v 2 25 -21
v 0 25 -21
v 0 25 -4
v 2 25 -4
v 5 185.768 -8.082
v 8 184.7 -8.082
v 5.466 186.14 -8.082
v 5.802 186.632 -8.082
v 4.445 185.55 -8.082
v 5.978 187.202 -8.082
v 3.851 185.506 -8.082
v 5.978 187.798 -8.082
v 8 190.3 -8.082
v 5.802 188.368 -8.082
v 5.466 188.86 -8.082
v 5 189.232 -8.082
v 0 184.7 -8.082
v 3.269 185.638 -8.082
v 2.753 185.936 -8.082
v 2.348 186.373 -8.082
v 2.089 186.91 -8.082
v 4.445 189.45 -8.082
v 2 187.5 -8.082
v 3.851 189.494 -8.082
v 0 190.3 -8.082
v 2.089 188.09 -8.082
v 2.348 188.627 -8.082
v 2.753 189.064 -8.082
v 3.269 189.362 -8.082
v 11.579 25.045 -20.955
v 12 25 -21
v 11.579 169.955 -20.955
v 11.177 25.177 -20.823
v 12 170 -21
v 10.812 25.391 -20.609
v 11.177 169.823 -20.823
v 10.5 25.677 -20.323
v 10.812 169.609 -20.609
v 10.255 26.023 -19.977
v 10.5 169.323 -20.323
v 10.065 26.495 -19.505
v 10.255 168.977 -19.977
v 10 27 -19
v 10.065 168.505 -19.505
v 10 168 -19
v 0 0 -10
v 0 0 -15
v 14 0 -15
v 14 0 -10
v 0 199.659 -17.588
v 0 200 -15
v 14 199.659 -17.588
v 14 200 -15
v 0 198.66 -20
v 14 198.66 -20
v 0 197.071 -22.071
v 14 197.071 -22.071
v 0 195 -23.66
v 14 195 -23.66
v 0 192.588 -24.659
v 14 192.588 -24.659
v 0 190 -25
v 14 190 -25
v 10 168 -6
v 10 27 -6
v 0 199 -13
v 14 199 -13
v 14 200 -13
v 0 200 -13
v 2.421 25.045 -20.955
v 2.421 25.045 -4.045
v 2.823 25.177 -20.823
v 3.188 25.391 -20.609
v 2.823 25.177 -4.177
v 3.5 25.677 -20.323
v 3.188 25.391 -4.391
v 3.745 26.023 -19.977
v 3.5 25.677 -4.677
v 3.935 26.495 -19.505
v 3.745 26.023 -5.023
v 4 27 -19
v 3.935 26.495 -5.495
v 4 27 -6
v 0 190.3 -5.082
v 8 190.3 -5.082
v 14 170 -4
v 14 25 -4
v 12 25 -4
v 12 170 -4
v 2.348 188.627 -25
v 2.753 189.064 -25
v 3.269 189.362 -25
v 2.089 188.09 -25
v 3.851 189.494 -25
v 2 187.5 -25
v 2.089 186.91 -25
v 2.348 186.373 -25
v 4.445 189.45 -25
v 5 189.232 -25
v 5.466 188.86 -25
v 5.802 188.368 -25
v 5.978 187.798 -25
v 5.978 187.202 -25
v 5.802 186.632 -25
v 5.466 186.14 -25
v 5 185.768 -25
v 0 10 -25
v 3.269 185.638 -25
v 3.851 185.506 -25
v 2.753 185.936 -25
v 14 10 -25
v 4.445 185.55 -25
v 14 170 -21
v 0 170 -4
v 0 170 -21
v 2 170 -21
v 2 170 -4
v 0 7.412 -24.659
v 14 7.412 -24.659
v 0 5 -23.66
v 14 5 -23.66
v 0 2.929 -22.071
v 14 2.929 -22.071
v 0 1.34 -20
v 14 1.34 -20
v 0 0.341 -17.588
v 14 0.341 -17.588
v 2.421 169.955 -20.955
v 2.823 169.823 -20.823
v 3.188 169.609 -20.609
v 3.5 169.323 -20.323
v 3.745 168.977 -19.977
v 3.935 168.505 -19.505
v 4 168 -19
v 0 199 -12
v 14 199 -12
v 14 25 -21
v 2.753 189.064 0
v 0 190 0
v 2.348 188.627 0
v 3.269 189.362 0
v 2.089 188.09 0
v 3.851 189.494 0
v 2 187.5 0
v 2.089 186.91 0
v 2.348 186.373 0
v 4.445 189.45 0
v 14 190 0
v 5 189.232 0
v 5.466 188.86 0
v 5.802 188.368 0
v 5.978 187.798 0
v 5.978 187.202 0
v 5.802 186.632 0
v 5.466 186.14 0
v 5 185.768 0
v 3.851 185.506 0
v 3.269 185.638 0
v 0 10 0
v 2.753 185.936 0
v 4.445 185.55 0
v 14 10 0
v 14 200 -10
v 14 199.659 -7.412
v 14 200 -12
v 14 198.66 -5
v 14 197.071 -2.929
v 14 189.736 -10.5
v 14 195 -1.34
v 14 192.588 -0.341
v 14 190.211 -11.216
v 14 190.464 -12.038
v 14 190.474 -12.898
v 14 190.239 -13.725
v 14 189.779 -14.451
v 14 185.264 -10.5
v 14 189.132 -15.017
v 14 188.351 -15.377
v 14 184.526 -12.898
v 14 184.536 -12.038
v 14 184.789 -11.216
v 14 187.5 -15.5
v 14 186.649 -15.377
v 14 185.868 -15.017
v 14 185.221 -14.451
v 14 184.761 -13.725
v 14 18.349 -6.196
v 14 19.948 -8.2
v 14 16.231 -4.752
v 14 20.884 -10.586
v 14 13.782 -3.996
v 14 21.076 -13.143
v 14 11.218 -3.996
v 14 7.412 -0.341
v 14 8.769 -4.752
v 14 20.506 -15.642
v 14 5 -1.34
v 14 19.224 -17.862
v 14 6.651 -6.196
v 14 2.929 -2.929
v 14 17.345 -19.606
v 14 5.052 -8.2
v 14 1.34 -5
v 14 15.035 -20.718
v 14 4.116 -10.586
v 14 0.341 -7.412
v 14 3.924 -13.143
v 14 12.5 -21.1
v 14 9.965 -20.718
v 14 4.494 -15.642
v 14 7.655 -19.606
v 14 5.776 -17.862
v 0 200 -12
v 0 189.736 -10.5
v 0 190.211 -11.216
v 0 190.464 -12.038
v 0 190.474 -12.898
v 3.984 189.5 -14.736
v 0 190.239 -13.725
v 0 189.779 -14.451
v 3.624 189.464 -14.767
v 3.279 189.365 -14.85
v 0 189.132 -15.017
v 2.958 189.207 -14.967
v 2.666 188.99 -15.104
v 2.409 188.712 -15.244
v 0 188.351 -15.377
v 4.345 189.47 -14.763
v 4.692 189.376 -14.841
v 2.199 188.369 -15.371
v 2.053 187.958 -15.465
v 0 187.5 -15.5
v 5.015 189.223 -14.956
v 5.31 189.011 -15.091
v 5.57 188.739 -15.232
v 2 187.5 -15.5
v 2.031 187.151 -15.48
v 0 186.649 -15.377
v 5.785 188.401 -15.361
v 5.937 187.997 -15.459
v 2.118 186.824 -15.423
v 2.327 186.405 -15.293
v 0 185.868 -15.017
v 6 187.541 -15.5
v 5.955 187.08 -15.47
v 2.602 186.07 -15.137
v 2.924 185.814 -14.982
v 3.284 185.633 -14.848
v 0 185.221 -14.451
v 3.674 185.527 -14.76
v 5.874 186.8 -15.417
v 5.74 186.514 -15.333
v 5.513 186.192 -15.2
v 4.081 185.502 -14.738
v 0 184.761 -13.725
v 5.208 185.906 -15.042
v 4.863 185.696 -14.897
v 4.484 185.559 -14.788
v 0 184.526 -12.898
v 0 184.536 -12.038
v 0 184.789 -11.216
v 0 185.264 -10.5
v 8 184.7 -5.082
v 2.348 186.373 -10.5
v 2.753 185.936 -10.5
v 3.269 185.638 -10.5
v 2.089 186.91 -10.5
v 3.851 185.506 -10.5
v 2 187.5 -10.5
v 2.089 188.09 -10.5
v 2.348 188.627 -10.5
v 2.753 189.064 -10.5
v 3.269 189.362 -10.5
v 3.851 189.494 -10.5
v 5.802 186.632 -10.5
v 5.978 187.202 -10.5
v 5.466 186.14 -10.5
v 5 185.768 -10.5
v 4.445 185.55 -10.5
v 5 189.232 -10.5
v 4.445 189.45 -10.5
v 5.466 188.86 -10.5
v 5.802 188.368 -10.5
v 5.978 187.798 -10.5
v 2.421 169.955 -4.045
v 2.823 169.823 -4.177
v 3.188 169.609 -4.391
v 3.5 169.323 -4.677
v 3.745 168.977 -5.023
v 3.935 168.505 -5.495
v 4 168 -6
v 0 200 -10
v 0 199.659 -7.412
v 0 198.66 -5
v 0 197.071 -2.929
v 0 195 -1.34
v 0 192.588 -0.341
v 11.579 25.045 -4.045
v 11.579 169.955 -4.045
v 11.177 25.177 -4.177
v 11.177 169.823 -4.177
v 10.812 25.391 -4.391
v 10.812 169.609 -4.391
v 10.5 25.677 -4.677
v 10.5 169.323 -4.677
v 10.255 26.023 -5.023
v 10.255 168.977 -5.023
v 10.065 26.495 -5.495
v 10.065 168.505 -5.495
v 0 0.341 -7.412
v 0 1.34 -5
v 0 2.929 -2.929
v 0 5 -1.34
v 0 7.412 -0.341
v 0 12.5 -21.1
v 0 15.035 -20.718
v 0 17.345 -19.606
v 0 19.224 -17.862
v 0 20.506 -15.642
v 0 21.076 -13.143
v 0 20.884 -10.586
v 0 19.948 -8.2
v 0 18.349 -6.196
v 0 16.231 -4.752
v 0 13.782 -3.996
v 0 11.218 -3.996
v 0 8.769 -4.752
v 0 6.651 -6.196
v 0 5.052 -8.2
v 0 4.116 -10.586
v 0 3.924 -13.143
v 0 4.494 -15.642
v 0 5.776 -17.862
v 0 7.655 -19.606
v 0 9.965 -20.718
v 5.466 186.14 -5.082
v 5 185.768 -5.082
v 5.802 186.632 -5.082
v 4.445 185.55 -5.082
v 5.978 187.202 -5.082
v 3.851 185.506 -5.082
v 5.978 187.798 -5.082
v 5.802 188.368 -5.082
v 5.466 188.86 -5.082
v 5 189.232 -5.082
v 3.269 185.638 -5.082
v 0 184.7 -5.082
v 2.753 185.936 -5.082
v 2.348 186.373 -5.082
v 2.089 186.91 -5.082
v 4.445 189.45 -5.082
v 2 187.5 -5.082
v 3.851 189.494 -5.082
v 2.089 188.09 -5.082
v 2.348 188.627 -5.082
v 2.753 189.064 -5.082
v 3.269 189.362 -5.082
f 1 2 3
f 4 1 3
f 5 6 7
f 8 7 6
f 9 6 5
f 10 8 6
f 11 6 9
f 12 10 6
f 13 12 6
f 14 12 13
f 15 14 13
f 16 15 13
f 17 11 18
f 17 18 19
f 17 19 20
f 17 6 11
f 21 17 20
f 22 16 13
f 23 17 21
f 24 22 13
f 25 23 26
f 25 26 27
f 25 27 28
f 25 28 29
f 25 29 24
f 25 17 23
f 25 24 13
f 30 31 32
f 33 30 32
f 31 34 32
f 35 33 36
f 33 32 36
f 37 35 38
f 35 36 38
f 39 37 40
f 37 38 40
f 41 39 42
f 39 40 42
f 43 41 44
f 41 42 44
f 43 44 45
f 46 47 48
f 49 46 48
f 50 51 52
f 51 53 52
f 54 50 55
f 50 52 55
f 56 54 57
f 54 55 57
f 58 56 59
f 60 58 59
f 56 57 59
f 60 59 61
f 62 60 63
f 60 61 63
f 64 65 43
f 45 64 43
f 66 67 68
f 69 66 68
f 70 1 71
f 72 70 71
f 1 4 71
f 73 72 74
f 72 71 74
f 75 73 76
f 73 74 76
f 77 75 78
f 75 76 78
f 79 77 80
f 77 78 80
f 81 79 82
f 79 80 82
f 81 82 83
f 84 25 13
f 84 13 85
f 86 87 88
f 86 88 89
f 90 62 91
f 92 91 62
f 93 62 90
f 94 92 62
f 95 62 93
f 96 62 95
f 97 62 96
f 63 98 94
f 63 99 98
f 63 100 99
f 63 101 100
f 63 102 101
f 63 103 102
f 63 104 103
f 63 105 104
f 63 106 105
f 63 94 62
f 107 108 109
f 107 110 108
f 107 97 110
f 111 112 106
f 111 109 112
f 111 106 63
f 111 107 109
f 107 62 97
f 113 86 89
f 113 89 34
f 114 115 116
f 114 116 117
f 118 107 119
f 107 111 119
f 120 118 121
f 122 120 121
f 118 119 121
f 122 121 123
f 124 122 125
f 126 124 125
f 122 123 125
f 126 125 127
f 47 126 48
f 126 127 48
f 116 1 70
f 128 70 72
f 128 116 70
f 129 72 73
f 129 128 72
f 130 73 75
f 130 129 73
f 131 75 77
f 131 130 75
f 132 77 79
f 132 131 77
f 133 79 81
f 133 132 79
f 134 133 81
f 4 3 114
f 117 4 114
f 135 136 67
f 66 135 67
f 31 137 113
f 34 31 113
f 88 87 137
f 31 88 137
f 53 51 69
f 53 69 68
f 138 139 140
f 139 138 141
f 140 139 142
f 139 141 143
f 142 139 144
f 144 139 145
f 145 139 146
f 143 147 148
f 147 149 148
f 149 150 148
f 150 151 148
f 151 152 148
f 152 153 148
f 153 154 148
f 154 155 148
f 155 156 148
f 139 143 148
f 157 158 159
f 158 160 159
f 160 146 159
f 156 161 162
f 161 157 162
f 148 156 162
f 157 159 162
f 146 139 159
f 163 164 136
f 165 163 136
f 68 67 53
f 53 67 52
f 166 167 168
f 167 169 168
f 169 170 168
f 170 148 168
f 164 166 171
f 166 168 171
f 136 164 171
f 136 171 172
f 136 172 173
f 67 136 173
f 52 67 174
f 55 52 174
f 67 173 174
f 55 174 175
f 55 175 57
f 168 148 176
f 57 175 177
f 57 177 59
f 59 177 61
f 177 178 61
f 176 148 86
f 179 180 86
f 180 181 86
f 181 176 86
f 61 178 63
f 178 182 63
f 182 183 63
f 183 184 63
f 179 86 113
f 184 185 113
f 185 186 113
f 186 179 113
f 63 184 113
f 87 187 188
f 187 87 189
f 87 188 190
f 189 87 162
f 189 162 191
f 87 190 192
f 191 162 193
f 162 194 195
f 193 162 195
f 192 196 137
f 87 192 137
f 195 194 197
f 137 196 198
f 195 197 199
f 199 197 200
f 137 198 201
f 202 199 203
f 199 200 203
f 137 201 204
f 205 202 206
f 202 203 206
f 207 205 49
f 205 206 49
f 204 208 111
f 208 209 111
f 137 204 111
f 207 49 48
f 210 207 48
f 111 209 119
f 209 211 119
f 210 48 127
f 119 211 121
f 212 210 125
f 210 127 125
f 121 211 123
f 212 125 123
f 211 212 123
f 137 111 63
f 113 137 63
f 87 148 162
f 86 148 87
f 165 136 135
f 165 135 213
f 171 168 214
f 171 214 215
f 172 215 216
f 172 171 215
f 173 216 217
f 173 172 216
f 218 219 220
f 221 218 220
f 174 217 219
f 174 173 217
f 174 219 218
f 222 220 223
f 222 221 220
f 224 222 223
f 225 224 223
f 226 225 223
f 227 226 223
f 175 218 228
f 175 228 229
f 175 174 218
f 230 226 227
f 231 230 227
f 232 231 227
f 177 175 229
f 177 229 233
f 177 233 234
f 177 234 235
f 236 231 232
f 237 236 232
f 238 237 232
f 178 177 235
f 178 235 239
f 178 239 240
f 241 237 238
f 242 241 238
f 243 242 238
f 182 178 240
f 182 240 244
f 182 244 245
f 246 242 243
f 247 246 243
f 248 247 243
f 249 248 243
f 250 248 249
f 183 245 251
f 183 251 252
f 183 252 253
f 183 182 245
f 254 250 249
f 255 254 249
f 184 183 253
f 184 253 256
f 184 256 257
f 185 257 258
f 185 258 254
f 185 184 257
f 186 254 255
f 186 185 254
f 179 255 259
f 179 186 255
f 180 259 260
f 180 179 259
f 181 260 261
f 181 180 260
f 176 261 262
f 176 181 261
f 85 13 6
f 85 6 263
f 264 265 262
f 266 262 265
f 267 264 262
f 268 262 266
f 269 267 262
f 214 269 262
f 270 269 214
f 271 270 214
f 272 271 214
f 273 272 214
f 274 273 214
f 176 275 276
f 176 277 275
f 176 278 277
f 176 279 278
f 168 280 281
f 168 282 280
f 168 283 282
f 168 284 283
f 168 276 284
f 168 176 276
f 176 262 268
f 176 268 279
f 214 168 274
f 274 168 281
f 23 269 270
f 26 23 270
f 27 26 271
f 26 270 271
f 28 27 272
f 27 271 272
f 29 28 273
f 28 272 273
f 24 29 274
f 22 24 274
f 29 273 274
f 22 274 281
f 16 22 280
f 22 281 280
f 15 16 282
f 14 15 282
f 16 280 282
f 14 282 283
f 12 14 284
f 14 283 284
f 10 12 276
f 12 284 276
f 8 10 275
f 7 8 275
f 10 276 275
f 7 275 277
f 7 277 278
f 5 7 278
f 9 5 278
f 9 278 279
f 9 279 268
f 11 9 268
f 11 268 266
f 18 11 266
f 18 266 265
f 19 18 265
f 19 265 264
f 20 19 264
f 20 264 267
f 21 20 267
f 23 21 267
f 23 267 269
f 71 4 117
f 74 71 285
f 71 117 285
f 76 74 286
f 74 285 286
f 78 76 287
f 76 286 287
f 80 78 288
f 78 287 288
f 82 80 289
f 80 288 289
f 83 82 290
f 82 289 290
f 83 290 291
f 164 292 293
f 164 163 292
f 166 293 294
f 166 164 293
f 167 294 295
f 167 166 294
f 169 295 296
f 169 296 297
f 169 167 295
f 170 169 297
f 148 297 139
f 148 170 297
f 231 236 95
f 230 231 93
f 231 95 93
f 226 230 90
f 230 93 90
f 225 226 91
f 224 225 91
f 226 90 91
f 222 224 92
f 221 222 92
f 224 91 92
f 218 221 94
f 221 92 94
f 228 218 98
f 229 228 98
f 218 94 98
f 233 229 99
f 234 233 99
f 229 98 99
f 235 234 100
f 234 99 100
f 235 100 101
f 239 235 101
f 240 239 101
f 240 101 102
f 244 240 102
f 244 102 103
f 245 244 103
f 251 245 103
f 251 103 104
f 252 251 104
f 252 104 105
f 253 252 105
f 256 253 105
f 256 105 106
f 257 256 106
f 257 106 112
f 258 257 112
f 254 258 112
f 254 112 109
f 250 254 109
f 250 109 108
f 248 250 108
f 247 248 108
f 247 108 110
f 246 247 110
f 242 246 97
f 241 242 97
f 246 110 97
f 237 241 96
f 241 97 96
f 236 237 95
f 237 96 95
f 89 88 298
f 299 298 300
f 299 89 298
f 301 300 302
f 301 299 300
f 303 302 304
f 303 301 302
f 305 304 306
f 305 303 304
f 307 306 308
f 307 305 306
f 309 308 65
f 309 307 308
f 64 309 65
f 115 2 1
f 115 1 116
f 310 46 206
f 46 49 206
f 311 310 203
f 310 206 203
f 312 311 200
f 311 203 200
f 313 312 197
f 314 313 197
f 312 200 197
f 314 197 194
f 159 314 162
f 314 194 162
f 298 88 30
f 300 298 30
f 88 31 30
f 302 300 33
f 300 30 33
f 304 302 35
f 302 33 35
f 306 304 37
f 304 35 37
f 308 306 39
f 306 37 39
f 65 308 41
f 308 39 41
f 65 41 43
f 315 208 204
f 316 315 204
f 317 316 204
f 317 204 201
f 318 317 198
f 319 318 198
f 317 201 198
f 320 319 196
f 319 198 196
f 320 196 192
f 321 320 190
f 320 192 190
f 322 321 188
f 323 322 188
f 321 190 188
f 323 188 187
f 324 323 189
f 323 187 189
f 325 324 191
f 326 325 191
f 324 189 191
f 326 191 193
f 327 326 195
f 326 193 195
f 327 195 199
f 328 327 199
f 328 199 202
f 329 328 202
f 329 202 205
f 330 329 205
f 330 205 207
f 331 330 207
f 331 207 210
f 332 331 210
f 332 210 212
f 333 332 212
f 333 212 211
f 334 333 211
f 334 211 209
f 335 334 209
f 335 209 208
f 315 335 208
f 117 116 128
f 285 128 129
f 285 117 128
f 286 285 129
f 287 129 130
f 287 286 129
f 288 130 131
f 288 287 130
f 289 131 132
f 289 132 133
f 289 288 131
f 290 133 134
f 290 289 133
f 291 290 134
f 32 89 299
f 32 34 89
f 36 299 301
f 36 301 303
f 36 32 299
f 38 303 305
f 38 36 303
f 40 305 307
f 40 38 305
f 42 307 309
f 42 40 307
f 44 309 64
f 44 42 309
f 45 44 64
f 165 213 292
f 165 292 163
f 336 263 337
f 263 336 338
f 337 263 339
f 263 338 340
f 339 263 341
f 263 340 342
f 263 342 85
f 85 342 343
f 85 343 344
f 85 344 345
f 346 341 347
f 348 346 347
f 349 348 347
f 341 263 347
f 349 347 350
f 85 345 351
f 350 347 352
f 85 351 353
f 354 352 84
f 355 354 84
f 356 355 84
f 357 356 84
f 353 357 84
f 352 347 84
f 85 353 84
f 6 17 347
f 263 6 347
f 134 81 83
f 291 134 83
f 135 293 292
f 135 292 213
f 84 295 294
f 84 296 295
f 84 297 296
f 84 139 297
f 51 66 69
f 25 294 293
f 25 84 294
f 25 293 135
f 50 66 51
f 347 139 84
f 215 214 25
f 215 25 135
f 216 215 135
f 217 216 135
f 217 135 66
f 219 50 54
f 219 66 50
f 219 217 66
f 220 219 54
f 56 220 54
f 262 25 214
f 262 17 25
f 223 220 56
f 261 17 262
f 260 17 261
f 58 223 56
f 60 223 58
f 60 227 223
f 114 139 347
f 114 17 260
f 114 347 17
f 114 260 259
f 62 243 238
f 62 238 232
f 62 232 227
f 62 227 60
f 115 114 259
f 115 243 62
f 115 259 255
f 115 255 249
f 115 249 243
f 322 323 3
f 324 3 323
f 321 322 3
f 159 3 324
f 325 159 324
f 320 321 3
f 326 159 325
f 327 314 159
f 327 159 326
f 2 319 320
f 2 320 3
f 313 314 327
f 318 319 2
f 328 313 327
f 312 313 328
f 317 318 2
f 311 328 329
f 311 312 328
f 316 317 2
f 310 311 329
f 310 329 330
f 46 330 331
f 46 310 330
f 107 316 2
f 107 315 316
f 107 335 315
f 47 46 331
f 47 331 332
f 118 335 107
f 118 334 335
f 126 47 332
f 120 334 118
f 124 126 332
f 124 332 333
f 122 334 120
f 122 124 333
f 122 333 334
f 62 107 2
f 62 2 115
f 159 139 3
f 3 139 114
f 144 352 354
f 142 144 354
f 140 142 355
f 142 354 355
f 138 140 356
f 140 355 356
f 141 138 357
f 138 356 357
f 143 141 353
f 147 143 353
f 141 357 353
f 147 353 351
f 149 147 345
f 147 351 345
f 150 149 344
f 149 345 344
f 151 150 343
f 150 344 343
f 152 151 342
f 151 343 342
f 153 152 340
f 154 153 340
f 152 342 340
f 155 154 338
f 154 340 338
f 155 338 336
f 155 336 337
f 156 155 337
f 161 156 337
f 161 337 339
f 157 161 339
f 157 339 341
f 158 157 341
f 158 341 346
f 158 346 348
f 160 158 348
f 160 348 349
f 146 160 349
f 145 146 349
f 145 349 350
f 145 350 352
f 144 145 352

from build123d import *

# Parameters (mm, degrees)
CROQUIS1_W              = 14
CROQUIS1_H              = 25
SALIENTE_EXTRUIR1_DEPTH = 200
REDONDEO1_R             = 10
REDONDEO2_R             = 10
CROQUIS2_R              = 8.6
CORTAR_EXTRUIR1_DEPTH   = 28
CROQUIS14_R             = 9.913044
SALIENTE_EXTRUIR2_DEPTH = 14
CROQUIS12_R             = 2
CORTAR_EXTRUIR7_DEPTH   = 203.042074826
CROQUIS15_W             = 3
CROQUIS15_H             = 5.6
CORTAR_EXTRUIR9_DEPTH   = 8
CROQUIS16_W             = 17
CROQUIS16_H             = 145
CORTAR_EXTRUIR10_DEPTH  = 4
CROQUIS17_W             = 17
CROQUIS17_H             = 145
CORTAR_EXTRUIR11_DEPTH  = 4
REDONDEO5_R             = 2
REDONDEO6_R             = 2
CROQUIS18_W             = 1
CROQUIS18_H             = 1
CORTAR_EXTRUIR12_DEPTH  = 203.042074845
REDONDEO9_R             = 10
REDONDEO10_R            = 10


with BuildPart() as part:
    # Croquis1 → Saliente-Extruir1 (new body)
    with BuildSketch(Plane(origin=(0, 0, 0), x_dir=(1, 0, 0), z_dir=(0, 1, 0))):
        with Locations((7, 12.5)):
            Rectangle(CROQUIS1_W, CROQUIS1_H)
    extrude(amount=SALIENTE_EXTRUIR1_DEPTH)

    # Redondeo1
    redondeo1_edges = [part.edges().sort_by_distance(p)[0] for p in [
        (7, 0, -25),
    ]]
    fillet(redondeo1_edges, radius=REDONDEO1_R)

    # Redondeo2
    redondeo2_edges = [part.edges().sort_by_distance(p)[0] for p in [
        (7, 0, 0),
    ]]
    fillet(redondeo2_edges, radius=REDONDEO2_R)

    # Croquis2 → Cortar-Extruir1 (cut)
    with BuildSketch(Plane(origin=(14, 0, 0), x_dir=(0, 0, -1), z_dir=(1, 0, 0))):
        with Locations((12.5, 12.5)):
            Circle(CROQUIS2_R)
        with BuildLine():
            Line((10.5, 185.263932023), (10.5, 189.736067977))
            ThreePointArc((10.5, 189.736067977), (15.5, 187.5), (10.5, 185.263932023))
        make_face()
    extrude(amount=-CORTAR_EXTRUIR1_DEPTH, mode=Mode.SUBTRACT)

    # Croquis14 → Saliente-Extruir2 (add)
    with BuildSketch(Plane(origin=(14, 0, 0), x_dir=(0, 0, -1), z_dir=(1, 0, 0))):
        with Locations((12.5, 187.5)):
            Circle(CROQUIS14_R)
        with BuildLine():
            Line((10.5, 185.263932023), (10.5, 189.736067977))
            ThreePointArc((10.5, 189.736067977), (15.5, 187.5), (10.5, 185.263932023))
        make_face(mode=Mode.SUBTRACT)
    extrude(amount=-SALIENTE_EXTRUIR2_DEPTH)

    # Croquis12 → Cortar-Extruir7 (cut, through all)
    with BuildSketch(Plane(origin=(0, 0, -25), x_dir=(-1, 0, 0), z_dir=(0, 0, -1))):
        with Locations((-4, 187.5)):
            Circle(CROQUIS12_R)
    extrude(amount=-CORTAR_EXTRUIR7_DEPTH, mode=Mode.SUBTRACT)

    # Croquis15 → Cortar-Extruir9 (cut)
    with BuildSketch(Plane.ZY):
        with Locations((-6.582205818, 187.5)):
            Rectangle(CROQUIS15_W, CROQUIS15_H)
    extrude(amount=-CORTAR_EXTRUIR9_DEPTH, mode=Mode.SUBTRACT)

    # Croquis16 → Cortar-Extruir10 (cut)
    with BuildSketch(Plane.ZY):
        with Locations((-12.5, 97.5)):
            Rectangle(CROQUIS16_W, CROQUIS16_H)
    extrude(amount=-CORTAR_EXTRUIR10_DEPTH, mode=Mode.SUBTRACT)

    # Croquis17 → Cortar-Extruir11 (cut)
    with BuildSketch(Plane(origin=(14, 0, 0), x_dir=(0, 0, -1), z_dir=(1, 0, 0))):
        with Locations((12.5, 97.5)):
            Rectangle(CROQUIS17_W, CROQUIS17_H)
    extrude(amount=-CORTAR_EXTRUIR11_DEPTH, mode=Mode.SUBTRACT)

    # Redondeo5
    redondeo5_edges = [part.edges().sort_by_distance(p)[0] for p in [
        (4, 97.5, -21),
        (4, 170, -12.5),
        (4, 97.5, -4),
        (4, 25, -12.5),
    ]]
    fillet(redondeo5_edges, radius=REDONDEO5_R)

    # Redondeo6
    redondeo6_edges = [part.edges().sort_by_distance(p)[0] for p in [
        (10, 97.5, -21),
        (10, 25, -12.5),
        (10, 97.5, -4),
        (10, 170, -12.5),
    ]]
    fillet(redondeo6_edges, radius=REDONDEO6_R)

    # Croquis18 → Cortar-Extruir12 (cut, through all)
    with BuildSketch(Plane(origin=(14, 0, 0), x_dir=(0, 0, -1), z_dir=(1, 0, 0))):
        with Locations((12.5, 199.5)):
            Rectangle(CROQUIS18_W, CROQUIS18_H)
    extrude(amount=-CORTAR_EXTRUIR12_DEPTH, mode=Mode.SUBTRACT)

    # Redondeo9
    redondeo9_edges = [part.edges().sort_by_distance(p)[0] for p in [
        (7, 200, 0),
    ]]
    fillet(redondeo9_edges, radius=REDONDEO9_R)

    # Redondeo10
    redondeo10_edges = [part.edges().sort_by_distance(p)[0] for p in [
        (7, 200, -25),
    ]]
    fillet(redondeo10_edges, radius=REDONDEO10_R)


solid = part.part
